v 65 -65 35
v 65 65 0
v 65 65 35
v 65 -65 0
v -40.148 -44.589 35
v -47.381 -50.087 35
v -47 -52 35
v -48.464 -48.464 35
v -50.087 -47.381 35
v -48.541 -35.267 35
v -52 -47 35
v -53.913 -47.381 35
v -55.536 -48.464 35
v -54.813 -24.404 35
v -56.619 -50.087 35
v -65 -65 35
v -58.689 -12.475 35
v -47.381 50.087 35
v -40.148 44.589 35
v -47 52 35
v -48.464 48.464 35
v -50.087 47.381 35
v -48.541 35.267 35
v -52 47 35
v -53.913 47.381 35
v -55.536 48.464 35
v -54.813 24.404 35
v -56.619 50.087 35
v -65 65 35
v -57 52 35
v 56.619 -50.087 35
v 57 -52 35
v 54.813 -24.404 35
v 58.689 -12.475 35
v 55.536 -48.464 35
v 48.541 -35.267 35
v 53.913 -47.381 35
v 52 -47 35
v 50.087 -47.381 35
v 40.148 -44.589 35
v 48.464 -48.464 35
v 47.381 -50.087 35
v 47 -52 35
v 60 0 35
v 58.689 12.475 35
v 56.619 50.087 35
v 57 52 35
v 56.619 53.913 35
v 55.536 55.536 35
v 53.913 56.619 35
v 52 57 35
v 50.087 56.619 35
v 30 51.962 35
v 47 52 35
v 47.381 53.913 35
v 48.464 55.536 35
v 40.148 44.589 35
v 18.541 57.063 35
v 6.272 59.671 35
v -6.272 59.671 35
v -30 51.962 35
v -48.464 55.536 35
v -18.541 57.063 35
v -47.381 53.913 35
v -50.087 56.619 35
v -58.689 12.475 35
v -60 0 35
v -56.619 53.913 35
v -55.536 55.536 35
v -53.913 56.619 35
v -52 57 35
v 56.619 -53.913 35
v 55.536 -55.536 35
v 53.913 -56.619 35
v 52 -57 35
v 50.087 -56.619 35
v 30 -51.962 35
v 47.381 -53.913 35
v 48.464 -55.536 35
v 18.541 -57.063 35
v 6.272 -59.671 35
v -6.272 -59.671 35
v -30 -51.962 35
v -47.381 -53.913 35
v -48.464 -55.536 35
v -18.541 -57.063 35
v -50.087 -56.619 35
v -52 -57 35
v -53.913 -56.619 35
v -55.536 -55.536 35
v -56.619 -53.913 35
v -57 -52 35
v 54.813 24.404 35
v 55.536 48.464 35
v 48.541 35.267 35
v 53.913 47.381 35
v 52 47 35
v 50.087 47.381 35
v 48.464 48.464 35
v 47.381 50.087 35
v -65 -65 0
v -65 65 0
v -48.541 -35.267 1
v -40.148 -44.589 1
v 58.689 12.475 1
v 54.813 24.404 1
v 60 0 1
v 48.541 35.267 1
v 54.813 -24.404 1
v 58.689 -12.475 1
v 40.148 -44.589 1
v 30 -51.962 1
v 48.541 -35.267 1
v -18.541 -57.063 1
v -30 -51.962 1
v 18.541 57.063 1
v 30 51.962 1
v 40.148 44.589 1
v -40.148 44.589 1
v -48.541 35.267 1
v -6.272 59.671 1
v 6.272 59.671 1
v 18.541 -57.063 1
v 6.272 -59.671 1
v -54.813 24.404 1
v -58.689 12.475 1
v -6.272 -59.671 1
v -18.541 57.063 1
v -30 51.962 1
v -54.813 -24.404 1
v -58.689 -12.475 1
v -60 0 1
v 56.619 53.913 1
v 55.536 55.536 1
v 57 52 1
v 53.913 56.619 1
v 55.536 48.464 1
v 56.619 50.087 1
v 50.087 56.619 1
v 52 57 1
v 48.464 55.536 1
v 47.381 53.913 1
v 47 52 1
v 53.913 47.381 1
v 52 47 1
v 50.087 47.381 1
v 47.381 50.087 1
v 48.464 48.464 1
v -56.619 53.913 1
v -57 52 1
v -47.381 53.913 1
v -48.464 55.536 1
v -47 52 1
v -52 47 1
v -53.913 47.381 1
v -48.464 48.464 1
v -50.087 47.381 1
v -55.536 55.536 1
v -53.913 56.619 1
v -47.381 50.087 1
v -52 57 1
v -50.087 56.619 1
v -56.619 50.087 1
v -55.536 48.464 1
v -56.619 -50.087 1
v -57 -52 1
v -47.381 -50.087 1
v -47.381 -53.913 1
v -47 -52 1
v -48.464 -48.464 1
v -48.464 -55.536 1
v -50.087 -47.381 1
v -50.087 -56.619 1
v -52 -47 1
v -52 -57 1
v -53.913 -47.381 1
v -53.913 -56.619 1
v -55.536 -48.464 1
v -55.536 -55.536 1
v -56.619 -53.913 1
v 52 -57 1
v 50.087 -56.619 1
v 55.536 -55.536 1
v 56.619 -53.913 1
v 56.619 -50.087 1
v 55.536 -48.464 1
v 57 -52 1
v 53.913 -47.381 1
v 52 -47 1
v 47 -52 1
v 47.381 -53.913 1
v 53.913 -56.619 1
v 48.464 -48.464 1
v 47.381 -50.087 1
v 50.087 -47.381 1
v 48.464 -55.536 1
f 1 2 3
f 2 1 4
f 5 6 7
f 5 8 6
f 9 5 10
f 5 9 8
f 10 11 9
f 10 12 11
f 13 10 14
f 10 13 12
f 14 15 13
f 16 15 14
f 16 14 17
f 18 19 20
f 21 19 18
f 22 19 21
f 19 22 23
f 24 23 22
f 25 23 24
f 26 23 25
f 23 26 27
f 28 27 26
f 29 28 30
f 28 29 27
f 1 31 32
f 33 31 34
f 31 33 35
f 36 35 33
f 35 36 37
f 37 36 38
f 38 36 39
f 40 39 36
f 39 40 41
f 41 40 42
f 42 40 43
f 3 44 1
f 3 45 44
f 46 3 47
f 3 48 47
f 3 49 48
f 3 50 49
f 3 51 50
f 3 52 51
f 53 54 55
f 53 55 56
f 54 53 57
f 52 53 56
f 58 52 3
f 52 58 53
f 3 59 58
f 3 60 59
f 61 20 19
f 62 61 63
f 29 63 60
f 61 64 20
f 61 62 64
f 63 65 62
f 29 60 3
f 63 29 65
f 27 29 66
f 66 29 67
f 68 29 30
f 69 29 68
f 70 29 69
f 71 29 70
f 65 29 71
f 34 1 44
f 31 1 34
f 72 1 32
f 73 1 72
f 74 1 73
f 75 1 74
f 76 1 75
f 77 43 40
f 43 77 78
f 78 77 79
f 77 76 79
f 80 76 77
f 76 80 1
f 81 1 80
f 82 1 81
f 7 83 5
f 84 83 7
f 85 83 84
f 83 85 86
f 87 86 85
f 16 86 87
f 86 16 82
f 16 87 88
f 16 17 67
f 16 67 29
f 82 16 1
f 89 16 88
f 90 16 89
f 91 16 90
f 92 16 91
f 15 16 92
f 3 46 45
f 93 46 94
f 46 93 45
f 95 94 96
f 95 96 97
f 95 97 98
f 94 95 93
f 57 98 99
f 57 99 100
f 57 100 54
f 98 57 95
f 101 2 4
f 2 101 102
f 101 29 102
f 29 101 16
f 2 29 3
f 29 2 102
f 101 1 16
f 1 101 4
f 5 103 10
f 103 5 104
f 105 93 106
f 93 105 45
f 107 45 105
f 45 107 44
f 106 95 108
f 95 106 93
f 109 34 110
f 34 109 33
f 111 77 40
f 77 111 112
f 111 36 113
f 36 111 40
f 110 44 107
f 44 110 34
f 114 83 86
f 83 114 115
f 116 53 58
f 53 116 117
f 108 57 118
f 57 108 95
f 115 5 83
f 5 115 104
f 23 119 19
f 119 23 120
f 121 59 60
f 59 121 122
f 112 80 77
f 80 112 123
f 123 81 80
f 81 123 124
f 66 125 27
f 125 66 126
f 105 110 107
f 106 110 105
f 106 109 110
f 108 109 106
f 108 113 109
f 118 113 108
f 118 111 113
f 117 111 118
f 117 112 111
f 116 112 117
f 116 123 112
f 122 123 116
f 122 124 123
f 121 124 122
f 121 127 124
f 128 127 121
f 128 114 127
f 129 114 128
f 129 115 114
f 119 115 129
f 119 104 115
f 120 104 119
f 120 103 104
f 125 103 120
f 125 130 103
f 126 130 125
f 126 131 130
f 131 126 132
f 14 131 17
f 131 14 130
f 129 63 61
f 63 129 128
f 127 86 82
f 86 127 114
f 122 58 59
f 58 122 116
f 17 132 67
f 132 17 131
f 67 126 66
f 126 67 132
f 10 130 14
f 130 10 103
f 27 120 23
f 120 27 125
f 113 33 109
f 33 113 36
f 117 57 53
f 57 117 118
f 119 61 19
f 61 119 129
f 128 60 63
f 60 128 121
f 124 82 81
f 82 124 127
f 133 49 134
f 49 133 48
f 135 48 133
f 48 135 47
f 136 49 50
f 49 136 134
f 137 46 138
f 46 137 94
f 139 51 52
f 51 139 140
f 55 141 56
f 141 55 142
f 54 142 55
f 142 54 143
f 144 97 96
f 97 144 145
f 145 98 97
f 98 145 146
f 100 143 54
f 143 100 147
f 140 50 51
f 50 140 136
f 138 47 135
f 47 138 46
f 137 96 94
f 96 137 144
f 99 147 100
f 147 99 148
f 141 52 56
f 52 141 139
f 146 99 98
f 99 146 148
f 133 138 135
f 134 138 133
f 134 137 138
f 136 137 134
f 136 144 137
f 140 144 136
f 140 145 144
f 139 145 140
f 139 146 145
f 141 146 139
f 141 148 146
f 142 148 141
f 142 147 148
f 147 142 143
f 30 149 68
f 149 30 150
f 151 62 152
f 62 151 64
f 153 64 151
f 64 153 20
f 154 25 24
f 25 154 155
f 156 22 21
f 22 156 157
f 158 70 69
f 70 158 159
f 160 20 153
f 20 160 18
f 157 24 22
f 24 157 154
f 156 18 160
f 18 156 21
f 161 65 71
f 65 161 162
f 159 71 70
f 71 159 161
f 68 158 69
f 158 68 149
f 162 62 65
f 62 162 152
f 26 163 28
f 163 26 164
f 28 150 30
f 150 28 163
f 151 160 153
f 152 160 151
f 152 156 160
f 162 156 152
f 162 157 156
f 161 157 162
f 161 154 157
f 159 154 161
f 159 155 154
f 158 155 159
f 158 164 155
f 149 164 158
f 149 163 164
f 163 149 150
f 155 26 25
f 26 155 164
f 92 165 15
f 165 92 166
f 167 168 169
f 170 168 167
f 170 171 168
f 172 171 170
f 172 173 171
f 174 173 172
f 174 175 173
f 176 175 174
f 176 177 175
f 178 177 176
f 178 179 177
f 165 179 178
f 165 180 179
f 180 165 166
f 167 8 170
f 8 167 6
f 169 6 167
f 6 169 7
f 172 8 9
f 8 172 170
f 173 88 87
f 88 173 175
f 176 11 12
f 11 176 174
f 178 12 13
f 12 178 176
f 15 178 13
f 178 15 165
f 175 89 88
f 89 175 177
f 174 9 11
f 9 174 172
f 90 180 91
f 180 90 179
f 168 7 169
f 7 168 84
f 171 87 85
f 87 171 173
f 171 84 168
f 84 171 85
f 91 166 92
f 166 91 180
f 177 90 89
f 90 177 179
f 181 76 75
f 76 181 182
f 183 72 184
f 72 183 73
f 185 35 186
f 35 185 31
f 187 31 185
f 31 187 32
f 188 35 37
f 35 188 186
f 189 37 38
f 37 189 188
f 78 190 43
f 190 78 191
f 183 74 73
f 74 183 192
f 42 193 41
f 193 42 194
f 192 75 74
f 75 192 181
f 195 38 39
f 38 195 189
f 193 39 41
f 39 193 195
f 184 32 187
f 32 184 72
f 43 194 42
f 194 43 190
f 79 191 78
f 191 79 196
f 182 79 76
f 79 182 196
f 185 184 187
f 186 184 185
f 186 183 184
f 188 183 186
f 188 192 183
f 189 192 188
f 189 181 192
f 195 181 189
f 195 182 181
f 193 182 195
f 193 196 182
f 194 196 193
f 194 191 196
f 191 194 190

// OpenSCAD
cube_x= 130;  
cube_y= 130;  
cube_z= 35;    
pot_x= 60;
pot_y = 60;
pot_z = 60;
 
 

difference(){
    translate([-(cube_x/2),-(cube_y/2),0]){
        cube([cube_x, cube_y, cube_z]);
    }
	translate([0,0,1]){
		cylinder(pot_x,pot_y,pot_z); 
    }
    translate([(cube_x/2.5), (cube_y/2.5), 1]){
		cylinder(40,5,5);
    }
    translate([-(cube_x/2.5), (cube_y/2.5), 1]){
		cylinder(40,5,5);
    }
    translate([-(cube_x/2.5), -(cube_y/2.5), 1]){
		cylinder(40,5,5);
    }
    translate([(cube_x/2.5), -(cube_y/2.5), 1]){
		cylinder(40,5,5);
    }
} 
